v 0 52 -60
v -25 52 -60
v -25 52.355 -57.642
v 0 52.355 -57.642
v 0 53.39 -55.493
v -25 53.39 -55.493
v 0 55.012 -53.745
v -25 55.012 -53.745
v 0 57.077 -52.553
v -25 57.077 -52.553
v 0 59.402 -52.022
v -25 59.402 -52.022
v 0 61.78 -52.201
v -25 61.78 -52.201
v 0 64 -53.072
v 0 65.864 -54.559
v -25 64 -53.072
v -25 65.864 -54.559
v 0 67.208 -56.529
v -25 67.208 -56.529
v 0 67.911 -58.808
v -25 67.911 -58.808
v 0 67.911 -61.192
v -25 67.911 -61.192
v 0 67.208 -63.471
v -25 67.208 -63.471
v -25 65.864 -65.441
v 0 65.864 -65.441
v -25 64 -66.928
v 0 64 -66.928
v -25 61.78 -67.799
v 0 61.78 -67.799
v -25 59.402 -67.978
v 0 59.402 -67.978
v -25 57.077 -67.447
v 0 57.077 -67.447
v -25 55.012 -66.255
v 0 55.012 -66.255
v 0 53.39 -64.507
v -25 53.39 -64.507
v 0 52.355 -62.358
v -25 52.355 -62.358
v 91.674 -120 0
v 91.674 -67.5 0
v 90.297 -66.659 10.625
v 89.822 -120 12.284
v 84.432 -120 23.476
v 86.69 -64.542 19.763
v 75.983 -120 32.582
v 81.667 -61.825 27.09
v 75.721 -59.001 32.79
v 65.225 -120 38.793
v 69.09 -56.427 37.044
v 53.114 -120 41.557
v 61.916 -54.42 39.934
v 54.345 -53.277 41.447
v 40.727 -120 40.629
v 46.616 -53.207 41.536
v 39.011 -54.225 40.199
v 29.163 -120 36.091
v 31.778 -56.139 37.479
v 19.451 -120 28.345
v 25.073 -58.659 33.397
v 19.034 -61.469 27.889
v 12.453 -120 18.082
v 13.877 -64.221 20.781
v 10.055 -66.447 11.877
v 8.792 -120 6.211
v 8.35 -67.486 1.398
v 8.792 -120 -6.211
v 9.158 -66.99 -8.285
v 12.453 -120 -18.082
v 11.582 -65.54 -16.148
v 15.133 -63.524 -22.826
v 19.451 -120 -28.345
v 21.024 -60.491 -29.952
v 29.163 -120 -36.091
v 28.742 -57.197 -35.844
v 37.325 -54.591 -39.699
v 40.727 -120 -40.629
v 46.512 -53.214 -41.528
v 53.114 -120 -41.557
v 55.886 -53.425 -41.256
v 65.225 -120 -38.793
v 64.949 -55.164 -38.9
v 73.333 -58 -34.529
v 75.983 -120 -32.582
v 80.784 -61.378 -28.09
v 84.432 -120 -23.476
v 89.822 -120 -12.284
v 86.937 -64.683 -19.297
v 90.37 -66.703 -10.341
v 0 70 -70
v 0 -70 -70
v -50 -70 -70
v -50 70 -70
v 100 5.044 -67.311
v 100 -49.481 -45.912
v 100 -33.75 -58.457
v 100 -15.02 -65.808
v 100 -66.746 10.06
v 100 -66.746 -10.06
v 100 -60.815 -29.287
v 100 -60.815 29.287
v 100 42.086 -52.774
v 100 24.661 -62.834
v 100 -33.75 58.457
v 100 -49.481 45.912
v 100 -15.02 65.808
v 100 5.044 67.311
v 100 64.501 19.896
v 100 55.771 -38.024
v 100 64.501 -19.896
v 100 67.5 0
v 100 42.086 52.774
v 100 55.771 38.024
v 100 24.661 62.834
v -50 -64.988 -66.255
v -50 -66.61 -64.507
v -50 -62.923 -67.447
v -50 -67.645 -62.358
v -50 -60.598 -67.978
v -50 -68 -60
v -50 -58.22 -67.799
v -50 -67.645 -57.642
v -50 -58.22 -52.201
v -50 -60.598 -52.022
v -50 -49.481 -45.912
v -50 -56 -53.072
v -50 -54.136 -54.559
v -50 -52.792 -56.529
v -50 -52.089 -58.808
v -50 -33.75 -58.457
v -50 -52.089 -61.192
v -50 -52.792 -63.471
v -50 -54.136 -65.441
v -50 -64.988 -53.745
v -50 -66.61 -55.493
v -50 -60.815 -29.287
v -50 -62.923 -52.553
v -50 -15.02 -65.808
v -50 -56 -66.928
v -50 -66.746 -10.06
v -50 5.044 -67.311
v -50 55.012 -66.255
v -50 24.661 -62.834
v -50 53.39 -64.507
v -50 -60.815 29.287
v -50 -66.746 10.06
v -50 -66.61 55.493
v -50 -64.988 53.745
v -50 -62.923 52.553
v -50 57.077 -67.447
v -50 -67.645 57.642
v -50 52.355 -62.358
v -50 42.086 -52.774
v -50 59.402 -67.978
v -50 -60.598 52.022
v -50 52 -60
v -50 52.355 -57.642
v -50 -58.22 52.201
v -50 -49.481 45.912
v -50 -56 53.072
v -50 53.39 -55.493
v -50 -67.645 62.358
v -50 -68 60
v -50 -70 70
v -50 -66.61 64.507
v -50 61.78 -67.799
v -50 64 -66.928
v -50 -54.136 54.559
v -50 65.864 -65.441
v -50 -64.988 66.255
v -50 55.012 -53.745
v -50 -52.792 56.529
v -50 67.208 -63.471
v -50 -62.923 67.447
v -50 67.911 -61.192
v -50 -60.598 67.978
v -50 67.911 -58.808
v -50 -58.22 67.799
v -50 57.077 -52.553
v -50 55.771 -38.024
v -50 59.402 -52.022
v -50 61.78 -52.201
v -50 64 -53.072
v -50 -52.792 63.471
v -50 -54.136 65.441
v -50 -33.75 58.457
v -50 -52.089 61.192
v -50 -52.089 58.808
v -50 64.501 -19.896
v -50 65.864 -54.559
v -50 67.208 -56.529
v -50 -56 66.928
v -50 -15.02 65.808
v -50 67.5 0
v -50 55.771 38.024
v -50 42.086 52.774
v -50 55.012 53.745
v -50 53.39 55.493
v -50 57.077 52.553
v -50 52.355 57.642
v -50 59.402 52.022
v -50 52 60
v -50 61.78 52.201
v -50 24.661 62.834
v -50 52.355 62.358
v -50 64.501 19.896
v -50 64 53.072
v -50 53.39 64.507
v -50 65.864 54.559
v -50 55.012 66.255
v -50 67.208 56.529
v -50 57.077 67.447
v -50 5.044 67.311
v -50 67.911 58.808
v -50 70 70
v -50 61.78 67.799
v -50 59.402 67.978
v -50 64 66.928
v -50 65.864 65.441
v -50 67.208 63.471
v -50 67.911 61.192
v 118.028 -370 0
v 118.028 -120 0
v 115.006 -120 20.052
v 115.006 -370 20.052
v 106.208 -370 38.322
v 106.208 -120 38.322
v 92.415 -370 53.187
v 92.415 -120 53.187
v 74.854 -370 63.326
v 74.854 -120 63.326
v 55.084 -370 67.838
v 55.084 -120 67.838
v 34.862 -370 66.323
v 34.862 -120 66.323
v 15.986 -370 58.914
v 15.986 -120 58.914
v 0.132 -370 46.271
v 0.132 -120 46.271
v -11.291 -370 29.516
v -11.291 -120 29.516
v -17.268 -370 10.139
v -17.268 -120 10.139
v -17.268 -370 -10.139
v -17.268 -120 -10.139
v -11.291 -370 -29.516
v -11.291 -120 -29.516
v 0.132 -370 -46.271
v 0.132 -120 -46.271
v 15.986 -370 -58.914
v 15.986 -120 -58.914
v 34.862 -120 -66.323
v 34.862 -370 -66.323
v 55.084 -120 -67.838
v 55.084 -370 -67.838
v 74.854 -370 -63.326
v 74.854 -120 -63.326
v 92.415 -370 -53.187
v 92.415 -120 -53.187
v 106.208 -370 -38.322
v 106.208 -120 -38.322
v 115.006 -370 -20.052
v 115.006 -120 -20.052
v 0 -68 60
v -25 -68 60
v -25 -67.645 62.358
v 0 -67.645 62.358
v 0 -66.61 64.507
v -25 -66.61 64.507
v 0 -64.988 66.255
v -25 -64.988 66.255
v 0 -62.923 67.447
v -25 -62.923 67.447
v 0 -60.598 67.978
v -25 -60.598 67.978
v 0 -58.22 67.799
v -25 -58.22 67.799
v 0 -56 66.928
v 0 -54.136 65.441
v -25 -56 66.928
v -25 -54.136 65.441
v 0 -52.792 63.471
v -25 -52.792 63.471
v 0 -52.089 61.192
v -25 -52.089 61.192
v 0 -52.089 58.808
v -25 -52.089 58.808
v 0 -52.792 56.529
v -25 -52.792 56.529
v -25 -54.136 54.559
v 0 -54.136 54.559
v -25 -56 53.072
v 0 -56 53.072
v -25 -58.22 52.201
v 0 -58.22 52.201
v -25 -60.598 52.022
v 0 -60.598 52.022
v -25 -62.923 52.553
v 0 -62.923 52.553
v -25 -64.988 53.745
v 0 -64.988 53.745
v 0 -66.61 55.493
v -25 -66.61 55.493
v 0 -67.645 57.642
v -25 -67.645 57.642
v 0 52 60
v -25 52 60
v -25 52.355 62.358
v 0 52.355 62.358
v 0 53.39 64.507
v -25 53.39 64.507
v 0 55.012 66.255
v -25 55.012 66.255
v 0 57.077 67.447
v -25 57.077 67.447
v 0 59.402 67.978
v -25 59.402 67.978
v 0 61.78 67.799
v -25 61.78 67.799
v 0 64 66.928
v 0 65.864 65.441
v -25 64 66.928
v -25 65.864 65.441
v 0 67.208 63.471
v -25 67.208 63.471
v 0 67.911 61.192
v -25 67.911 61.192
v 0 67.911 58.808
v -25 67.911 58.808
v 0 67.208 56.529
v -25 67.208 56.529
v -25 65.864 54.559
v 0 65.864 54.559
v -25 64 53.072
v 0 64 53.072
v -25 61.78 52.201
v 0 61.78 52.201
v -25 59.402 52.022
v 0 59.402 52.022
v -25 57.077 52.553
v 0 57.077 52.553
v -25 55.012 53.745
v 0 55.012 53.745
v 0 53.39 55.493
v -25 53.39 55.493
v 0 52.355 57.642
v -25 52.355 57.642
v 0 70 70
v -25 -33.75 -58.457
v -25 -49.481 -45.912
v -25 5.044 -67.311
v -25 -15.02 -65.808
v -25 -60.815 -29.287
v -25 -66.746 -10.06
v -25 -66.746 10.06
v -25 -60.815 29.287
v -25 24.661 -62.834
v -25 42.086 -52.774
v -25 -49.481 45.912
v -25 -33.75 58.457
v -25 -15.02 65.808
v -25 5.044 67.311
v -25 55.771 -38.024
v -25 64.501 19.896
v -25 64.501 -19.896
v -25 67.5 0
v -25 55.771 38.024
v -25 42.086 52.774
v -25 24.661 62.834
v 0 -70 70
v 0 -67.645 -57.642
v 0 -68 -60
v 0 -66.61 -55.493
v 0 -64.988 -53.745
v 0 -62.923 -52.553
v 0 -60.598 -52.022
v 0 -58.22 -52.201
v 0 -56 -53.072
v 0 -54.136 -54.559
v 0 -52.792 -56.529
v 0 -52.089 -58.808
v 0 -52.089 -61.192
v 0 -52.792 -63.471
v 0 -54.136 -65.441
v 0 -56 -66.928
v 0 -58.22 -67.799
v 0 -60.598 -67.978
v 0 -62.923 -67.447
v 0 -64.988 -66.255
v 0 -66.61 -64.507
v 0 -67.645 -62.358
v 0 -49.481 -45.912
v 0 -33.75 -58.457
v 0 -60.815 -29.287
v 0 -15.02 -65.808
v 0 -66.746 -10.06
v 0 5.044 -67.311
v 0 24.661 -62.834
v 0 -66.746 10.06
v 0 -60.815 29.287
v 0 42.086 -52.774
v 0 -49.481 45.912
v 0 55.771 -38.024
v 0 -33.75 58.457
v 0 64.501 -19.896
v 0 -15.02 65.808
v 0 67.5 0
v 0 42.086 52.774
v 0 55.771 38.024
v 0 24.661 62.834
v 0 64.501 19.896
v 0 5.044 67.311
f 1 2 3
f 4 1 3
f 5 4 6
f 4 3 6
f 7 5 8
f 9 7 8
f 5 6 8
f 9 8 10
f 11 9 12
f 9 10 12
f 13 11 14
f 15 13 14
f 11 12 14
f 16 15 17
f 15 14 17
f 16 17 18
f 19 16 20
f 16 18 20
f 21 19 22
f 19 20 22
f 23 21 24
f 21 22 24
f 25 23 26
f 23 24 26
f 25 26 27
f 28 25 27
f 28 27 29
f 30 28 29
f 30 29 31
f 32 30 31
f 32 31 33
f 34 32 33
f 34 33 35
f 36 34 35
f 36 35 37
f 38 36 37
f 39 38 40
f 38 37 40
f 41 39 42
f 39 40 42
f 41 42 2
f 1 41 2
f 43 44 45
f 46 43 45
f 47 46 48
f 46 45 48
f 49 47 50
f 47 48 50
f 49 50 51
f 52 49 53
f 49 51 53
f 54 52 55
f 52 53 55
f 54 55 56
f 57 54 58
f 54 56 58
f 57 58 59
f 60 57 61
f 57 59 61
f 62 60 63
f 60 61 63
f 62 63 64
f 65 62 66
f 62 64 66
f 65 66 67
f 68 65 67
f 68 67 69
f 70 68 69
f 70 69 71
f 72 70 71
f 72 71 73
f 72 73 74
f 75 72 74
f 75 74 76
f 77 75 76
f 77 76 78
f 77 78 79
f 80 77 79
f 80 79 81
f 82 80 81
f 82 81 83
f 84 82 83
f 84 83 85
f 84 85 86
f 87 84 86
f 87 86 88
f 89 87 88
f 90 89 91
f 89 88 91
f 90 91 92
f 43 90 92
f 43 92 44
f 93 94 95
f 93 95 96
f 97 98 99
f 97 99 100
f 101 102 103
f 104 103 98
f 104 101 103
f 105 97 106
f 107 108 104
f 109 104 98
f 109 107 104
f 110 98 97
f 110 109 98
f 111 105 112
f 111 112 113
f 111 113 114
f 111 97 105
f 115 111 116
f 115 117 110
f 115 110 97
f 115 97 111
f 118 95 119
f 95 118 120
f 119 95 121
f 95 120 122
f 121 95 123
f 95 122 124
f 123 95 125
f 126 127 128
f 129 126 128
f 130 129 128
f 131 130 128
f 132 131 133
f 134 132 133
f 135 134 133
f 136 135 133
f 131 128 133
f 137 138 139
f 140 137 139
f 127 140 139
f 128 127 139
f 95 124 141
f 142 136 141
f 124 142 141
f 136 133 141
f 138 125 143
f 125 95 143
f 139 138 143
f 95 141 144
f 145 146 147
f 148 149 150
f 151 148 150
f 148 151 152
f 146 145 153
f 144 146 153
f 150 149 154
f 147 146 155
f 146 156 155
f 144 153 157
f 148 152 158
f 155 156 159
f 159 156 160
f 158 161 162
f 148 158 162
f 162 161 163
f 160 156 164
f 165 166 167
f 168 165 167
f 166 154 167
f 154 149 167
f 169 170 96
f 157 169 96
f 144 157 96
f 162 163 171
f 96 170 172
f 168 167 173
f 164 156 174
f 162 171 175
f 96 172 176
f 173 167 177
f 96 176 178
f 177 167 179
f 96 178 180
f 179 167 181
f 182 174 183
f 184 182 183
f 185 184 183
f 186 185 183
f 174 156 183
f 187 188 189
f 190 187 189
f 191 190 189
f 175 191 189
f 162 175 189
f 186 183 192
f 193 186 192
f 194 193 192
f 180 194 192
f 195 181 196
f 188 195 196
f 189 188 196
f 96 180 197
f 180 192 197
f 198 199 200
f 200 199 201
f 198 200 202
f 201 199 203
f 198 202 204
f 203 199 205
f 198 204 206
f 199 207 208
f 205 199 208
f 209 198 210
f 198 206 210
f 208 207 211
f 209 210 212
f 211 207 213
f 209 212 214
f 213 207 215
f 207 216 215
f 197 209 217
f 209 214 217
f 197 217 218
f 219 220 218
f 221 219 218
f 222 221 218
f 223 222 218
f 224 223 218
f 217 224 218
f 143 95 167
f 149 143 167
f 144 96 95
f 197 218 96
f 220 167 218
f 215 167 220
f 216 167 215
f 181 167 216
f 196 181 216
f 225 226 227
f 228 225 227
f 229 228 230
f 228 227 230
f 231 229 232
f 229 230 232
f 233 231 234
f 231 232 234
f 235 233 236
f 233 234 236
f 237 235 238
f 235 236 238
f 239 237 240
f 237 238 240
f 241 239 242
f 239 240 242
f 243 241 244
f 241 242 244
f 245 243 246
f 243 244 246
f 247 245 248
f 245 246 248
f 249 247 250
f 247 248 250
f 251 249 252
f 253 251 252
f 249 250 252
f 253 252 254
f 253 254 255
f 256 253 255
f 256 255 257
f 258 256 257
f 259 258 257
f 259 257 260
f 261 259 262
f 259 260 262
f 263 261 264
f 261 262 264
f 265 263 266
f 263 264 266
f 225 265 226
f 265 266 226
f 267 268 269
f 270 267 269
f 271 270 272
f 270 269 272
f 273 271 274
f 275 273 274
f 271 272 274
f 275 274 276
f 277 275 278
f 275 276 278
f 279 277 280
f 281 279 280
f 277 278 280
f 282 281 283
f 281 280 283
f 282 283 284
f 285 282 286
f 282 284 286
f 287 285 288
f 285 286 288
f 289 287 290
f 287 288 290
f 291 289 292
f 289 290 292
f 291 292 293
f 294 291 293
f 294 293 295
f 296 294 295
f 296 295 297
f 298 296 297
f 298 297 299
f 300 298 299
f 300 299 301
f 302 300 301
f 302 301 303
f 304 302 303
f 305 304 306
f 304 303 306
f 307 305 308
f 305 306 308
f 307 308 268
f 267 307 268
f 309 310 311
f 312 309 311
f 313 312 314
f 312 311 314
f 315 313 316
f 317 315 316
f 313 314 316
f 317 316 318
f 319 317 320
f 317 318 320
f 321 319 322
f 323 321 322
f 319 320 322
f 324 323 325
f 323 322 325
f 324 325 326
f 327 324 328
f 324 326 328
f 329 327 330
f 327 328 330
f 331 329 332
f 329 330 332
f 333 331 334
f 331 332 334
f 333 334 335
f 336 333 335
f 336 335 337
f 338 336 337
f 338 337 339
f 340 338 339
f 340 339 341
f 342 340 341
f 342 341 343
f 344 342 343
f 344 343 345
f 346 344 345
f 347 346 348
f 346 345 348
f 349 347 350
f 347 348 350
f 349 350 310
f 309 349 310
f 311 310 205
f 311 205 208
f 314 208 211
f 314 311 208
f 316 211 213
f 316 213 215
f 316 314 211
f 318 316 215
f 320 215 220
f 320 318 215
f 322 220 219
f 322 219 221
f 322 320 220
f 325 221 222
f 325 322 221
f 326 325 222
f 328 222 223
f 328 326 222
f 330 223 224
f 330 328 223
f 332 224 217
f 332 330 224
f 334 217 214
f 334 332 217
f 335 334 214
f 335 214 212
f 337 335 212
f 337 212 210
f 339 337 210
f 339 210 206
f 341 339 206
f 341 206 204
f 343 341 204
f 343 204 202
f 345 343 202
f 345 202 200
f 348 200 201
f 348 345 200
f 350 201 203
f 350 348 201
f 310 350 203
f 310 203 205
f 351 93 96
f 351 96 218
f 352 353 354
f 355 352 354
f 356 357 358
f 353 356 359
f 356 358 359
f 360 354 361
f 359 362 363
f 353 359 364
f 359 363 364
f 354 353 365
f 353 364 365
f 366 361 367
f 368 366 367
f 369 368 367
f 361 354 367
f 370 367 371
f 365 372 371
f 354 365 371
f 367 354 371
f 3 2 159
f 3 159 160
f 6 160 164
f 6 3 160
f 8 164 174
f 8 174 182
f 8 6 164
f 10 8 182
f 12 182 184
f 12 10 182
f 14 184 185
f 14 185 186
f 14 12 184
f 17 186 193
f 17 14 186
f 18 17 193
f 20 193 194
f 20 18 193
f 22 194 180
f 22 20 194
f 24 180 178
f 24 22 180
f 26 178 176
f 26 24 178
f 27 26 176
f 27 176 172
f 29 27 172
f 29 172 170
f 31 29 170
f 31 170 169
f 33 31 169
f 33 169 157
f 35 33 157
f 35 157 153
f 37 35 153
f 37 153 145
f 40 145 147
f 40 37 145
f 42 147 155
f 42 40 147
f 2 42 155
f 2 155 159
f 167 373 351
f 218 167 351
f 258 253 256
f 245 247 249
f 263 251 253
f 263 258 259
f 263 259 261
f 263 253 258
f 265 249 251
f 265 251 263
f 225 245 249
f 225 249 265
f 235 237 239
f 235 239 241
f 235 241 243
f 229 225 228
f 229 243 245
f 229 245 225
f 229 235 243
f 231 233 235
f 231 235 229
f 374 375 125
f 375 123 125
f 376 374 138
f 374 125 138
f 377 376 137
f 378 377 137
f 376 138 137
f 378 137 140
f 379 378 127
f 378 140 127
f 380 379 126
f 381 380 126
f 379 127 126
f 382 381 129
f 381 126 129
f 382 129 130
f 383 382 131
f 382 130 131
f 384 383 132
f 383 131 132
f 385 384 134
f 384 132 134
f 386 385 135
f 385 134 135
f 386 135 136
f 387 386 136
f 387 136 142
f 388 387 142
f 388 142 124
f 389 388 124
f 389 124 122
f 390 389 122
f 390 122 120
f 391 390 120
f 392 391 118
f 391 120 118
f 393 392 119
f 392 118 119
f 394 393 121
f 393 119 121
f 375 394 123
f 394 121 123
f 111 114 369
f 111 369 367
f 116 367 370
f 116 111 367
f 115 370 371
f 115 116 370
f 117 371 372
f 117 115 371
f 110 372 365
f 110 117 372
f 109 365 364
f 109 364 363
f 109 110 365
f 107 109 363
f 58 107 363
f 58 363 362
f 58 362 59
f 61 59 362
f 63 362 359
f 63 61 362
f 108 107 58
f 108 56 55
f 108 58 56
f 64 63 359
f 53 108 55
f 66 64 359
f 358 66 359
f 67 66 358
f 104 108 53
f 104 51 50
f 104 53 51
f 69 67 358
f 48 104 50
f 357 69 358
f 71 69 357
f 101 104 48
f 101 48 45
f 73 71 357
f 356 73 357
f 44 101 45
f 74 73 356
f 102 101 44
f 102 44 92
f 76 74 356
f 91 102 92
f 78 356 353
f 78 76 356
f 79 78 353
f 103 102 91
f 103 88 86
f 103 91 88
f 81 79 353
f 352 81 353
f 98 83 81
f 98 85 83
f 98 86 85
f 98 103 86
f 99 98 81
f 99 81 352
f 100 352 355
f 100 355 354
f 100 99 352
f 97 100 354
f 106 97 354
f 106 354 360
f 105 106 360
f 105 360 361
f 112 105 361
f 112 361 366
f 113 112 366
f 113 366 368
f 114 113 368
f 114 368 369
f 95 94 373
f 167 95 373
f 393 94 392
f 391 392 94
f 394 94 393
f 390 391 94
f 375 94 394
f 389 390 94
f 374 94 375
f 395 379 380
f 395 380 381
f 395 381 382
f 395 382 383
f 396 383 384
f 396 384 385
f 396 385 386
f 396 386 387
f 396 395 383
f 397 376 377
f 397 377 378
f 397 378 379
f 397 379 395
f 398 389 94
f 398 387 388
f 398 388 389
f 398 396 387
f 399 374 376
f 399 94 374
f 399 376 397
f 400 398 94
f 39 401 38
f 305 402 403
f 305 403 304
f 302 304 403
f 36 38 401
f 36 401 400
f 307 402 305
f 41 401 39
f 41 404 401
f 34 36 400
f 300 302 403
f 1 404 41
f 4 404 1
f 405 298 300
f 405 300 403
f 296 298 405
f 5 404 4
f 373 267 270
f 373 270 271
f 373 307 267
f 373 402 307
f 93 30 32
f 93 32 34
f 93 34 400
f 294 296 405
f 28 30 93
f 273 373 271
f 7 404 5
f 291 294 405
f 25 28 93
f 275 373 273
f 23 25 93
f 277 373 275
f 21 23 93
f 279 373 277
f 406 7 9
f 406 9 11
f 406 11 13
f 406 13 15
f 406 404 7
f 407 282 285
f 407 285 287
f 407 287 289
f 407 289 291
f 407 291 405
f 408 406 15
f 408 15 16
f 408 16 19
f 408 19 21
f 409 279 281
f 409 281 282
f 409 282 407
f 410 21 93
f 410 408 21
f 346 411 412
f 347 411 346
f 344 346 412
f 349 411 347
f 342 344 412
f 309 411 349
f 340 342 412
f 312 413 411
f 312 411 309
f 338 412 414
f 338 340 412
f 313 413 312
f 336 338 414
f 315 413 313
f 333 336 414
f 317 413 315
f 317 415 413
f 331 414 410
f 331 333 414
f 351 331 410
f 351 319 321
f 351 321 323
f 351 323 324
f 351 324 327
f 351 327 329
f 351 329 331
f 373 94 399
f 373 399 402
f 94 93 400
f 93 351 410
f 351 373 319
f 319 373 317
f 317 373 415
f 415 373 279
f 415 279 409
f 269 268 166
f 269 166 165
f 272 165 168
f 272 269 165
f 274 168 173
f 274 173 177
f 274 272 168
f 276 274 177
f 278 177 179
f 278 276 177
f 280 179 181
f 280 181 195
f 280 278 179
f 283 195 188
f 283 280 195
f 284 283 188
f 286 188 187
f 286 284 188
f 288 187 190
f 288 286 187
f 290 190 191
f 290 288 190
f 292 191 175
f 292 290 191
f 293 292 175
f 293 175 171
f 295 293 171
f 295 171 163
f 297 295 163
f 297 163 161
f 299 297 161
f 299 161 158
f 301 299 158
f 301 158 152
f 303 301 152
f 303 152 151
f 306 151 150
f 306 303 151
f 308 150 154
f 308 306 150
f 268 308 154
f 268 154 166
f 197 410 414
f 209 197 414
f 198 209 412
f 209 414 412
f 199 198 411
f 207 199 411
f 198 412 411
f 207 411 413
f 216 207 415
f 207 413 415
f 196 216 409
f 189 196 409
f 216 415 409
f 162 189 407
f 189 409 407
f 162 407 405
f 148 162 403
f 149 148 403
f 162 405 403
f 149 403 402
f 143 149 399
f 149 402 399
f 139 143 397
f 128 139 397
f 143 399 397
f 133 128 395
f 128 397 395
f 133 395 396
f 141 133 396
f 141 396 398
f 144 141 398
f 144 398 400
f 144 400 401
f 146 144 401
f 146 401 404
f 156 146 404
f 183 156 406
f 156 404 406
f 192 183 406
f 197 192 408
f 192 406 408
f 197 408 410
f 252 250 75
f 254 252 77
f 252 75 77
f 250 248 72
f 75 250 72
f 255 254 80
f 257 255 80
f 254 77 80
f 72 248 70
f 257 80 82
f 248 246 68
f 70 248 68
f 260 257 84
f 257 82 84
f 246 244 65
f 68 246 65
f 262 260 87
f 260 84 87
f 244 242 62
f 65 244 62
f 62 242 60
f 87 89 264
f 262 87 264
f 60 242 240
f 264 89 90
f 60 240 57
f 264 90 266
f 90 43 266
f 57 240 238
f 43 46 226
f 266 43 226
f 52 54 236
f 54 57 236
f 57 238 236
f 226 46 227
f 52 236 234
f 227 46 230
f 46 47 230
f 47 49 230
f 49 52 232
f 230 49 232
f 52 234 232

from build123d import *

# Parameters (mm, degrees)
F0_W          = 140
F0_H          = 140
F0_R          = 67.5
F1_DEPTH      = 50
F2_R          = 67.5
F3_DEPTH      = 100
F3_DEPTH_BACK = 25
F4_R          = 41.6737233106
F5_DEPTH      = 120
F6_R          = 68.028235637
F6_R_2        = 41.6737233106
F7_DEPTH      = 250
F8_DEPTH      = 370
F9_R          = 8
F10_DEPTH     = 25


with BuildPart() as f1:
    # F0 (on Right) → F1 (new body)
    with BuildSketch(Plane.YZ):
        Rectangle(F0_W, F0_H)
        Circle(F0_R, mode=Mode.SUBTRACT)
    extrude(amount=-F1_DEPTH)

    # F9 (on face) → F10 (cut, symmetric)
    with BuildSketch(Plane(origin=(-25, 0, 0), x_dir=(0, -1, 0), z_dir=(-1, 0, 0))):
        with Locations((60, 60)):
            Circle(F9_R)
        with Locations((-60, 60)):
            Circle(F9_R)
        with Locations((-60, -60)):
            Circle(F9_R)
        with Locations((60, -60)):
            Circle(F9_R)
    extrude(amount=F10_DEPTH, both=True, mode=Mode.SUBTRACT)


with BuildPart() as f3:
    # F2 (on face) → F3 (new body, two sides)
    with BuildSketch(Plane.YZ) as f3_sk:
        Circle(F2_R)
    extrude(amount=F3_DEPTH)
    extrude(f3_sk.sketch, amount=-F3_DEPTH_BACK)

    # F4 (on Front) → F5 (join)
    with BuildSketch(Plane.XZ):
        with Locations((50, 0)):
            Circle(F4_R)
    extrude(amount=F5_DEPTH)

    # F6 (on face) → F7 (join)
    with BuildSketch(Plane.XZ.offset(120)):
        with Locations((50, 0)):
            Circle(F6_R)
        with Locations((50, 0)):
            Circle(F6_R_2, mode=Mode.SUBTRACT)
    extrude(amount=F7_DEPTH)

    # F4 (on Front) → F8 (join, through all)
    with BuildSketch(Plane.XZ):
        with Locations((50, 0)):
            Circle(F4_R)
    extrude(amount=F8_DEPTH)


solid = Compound([f1.part, f3.part])
